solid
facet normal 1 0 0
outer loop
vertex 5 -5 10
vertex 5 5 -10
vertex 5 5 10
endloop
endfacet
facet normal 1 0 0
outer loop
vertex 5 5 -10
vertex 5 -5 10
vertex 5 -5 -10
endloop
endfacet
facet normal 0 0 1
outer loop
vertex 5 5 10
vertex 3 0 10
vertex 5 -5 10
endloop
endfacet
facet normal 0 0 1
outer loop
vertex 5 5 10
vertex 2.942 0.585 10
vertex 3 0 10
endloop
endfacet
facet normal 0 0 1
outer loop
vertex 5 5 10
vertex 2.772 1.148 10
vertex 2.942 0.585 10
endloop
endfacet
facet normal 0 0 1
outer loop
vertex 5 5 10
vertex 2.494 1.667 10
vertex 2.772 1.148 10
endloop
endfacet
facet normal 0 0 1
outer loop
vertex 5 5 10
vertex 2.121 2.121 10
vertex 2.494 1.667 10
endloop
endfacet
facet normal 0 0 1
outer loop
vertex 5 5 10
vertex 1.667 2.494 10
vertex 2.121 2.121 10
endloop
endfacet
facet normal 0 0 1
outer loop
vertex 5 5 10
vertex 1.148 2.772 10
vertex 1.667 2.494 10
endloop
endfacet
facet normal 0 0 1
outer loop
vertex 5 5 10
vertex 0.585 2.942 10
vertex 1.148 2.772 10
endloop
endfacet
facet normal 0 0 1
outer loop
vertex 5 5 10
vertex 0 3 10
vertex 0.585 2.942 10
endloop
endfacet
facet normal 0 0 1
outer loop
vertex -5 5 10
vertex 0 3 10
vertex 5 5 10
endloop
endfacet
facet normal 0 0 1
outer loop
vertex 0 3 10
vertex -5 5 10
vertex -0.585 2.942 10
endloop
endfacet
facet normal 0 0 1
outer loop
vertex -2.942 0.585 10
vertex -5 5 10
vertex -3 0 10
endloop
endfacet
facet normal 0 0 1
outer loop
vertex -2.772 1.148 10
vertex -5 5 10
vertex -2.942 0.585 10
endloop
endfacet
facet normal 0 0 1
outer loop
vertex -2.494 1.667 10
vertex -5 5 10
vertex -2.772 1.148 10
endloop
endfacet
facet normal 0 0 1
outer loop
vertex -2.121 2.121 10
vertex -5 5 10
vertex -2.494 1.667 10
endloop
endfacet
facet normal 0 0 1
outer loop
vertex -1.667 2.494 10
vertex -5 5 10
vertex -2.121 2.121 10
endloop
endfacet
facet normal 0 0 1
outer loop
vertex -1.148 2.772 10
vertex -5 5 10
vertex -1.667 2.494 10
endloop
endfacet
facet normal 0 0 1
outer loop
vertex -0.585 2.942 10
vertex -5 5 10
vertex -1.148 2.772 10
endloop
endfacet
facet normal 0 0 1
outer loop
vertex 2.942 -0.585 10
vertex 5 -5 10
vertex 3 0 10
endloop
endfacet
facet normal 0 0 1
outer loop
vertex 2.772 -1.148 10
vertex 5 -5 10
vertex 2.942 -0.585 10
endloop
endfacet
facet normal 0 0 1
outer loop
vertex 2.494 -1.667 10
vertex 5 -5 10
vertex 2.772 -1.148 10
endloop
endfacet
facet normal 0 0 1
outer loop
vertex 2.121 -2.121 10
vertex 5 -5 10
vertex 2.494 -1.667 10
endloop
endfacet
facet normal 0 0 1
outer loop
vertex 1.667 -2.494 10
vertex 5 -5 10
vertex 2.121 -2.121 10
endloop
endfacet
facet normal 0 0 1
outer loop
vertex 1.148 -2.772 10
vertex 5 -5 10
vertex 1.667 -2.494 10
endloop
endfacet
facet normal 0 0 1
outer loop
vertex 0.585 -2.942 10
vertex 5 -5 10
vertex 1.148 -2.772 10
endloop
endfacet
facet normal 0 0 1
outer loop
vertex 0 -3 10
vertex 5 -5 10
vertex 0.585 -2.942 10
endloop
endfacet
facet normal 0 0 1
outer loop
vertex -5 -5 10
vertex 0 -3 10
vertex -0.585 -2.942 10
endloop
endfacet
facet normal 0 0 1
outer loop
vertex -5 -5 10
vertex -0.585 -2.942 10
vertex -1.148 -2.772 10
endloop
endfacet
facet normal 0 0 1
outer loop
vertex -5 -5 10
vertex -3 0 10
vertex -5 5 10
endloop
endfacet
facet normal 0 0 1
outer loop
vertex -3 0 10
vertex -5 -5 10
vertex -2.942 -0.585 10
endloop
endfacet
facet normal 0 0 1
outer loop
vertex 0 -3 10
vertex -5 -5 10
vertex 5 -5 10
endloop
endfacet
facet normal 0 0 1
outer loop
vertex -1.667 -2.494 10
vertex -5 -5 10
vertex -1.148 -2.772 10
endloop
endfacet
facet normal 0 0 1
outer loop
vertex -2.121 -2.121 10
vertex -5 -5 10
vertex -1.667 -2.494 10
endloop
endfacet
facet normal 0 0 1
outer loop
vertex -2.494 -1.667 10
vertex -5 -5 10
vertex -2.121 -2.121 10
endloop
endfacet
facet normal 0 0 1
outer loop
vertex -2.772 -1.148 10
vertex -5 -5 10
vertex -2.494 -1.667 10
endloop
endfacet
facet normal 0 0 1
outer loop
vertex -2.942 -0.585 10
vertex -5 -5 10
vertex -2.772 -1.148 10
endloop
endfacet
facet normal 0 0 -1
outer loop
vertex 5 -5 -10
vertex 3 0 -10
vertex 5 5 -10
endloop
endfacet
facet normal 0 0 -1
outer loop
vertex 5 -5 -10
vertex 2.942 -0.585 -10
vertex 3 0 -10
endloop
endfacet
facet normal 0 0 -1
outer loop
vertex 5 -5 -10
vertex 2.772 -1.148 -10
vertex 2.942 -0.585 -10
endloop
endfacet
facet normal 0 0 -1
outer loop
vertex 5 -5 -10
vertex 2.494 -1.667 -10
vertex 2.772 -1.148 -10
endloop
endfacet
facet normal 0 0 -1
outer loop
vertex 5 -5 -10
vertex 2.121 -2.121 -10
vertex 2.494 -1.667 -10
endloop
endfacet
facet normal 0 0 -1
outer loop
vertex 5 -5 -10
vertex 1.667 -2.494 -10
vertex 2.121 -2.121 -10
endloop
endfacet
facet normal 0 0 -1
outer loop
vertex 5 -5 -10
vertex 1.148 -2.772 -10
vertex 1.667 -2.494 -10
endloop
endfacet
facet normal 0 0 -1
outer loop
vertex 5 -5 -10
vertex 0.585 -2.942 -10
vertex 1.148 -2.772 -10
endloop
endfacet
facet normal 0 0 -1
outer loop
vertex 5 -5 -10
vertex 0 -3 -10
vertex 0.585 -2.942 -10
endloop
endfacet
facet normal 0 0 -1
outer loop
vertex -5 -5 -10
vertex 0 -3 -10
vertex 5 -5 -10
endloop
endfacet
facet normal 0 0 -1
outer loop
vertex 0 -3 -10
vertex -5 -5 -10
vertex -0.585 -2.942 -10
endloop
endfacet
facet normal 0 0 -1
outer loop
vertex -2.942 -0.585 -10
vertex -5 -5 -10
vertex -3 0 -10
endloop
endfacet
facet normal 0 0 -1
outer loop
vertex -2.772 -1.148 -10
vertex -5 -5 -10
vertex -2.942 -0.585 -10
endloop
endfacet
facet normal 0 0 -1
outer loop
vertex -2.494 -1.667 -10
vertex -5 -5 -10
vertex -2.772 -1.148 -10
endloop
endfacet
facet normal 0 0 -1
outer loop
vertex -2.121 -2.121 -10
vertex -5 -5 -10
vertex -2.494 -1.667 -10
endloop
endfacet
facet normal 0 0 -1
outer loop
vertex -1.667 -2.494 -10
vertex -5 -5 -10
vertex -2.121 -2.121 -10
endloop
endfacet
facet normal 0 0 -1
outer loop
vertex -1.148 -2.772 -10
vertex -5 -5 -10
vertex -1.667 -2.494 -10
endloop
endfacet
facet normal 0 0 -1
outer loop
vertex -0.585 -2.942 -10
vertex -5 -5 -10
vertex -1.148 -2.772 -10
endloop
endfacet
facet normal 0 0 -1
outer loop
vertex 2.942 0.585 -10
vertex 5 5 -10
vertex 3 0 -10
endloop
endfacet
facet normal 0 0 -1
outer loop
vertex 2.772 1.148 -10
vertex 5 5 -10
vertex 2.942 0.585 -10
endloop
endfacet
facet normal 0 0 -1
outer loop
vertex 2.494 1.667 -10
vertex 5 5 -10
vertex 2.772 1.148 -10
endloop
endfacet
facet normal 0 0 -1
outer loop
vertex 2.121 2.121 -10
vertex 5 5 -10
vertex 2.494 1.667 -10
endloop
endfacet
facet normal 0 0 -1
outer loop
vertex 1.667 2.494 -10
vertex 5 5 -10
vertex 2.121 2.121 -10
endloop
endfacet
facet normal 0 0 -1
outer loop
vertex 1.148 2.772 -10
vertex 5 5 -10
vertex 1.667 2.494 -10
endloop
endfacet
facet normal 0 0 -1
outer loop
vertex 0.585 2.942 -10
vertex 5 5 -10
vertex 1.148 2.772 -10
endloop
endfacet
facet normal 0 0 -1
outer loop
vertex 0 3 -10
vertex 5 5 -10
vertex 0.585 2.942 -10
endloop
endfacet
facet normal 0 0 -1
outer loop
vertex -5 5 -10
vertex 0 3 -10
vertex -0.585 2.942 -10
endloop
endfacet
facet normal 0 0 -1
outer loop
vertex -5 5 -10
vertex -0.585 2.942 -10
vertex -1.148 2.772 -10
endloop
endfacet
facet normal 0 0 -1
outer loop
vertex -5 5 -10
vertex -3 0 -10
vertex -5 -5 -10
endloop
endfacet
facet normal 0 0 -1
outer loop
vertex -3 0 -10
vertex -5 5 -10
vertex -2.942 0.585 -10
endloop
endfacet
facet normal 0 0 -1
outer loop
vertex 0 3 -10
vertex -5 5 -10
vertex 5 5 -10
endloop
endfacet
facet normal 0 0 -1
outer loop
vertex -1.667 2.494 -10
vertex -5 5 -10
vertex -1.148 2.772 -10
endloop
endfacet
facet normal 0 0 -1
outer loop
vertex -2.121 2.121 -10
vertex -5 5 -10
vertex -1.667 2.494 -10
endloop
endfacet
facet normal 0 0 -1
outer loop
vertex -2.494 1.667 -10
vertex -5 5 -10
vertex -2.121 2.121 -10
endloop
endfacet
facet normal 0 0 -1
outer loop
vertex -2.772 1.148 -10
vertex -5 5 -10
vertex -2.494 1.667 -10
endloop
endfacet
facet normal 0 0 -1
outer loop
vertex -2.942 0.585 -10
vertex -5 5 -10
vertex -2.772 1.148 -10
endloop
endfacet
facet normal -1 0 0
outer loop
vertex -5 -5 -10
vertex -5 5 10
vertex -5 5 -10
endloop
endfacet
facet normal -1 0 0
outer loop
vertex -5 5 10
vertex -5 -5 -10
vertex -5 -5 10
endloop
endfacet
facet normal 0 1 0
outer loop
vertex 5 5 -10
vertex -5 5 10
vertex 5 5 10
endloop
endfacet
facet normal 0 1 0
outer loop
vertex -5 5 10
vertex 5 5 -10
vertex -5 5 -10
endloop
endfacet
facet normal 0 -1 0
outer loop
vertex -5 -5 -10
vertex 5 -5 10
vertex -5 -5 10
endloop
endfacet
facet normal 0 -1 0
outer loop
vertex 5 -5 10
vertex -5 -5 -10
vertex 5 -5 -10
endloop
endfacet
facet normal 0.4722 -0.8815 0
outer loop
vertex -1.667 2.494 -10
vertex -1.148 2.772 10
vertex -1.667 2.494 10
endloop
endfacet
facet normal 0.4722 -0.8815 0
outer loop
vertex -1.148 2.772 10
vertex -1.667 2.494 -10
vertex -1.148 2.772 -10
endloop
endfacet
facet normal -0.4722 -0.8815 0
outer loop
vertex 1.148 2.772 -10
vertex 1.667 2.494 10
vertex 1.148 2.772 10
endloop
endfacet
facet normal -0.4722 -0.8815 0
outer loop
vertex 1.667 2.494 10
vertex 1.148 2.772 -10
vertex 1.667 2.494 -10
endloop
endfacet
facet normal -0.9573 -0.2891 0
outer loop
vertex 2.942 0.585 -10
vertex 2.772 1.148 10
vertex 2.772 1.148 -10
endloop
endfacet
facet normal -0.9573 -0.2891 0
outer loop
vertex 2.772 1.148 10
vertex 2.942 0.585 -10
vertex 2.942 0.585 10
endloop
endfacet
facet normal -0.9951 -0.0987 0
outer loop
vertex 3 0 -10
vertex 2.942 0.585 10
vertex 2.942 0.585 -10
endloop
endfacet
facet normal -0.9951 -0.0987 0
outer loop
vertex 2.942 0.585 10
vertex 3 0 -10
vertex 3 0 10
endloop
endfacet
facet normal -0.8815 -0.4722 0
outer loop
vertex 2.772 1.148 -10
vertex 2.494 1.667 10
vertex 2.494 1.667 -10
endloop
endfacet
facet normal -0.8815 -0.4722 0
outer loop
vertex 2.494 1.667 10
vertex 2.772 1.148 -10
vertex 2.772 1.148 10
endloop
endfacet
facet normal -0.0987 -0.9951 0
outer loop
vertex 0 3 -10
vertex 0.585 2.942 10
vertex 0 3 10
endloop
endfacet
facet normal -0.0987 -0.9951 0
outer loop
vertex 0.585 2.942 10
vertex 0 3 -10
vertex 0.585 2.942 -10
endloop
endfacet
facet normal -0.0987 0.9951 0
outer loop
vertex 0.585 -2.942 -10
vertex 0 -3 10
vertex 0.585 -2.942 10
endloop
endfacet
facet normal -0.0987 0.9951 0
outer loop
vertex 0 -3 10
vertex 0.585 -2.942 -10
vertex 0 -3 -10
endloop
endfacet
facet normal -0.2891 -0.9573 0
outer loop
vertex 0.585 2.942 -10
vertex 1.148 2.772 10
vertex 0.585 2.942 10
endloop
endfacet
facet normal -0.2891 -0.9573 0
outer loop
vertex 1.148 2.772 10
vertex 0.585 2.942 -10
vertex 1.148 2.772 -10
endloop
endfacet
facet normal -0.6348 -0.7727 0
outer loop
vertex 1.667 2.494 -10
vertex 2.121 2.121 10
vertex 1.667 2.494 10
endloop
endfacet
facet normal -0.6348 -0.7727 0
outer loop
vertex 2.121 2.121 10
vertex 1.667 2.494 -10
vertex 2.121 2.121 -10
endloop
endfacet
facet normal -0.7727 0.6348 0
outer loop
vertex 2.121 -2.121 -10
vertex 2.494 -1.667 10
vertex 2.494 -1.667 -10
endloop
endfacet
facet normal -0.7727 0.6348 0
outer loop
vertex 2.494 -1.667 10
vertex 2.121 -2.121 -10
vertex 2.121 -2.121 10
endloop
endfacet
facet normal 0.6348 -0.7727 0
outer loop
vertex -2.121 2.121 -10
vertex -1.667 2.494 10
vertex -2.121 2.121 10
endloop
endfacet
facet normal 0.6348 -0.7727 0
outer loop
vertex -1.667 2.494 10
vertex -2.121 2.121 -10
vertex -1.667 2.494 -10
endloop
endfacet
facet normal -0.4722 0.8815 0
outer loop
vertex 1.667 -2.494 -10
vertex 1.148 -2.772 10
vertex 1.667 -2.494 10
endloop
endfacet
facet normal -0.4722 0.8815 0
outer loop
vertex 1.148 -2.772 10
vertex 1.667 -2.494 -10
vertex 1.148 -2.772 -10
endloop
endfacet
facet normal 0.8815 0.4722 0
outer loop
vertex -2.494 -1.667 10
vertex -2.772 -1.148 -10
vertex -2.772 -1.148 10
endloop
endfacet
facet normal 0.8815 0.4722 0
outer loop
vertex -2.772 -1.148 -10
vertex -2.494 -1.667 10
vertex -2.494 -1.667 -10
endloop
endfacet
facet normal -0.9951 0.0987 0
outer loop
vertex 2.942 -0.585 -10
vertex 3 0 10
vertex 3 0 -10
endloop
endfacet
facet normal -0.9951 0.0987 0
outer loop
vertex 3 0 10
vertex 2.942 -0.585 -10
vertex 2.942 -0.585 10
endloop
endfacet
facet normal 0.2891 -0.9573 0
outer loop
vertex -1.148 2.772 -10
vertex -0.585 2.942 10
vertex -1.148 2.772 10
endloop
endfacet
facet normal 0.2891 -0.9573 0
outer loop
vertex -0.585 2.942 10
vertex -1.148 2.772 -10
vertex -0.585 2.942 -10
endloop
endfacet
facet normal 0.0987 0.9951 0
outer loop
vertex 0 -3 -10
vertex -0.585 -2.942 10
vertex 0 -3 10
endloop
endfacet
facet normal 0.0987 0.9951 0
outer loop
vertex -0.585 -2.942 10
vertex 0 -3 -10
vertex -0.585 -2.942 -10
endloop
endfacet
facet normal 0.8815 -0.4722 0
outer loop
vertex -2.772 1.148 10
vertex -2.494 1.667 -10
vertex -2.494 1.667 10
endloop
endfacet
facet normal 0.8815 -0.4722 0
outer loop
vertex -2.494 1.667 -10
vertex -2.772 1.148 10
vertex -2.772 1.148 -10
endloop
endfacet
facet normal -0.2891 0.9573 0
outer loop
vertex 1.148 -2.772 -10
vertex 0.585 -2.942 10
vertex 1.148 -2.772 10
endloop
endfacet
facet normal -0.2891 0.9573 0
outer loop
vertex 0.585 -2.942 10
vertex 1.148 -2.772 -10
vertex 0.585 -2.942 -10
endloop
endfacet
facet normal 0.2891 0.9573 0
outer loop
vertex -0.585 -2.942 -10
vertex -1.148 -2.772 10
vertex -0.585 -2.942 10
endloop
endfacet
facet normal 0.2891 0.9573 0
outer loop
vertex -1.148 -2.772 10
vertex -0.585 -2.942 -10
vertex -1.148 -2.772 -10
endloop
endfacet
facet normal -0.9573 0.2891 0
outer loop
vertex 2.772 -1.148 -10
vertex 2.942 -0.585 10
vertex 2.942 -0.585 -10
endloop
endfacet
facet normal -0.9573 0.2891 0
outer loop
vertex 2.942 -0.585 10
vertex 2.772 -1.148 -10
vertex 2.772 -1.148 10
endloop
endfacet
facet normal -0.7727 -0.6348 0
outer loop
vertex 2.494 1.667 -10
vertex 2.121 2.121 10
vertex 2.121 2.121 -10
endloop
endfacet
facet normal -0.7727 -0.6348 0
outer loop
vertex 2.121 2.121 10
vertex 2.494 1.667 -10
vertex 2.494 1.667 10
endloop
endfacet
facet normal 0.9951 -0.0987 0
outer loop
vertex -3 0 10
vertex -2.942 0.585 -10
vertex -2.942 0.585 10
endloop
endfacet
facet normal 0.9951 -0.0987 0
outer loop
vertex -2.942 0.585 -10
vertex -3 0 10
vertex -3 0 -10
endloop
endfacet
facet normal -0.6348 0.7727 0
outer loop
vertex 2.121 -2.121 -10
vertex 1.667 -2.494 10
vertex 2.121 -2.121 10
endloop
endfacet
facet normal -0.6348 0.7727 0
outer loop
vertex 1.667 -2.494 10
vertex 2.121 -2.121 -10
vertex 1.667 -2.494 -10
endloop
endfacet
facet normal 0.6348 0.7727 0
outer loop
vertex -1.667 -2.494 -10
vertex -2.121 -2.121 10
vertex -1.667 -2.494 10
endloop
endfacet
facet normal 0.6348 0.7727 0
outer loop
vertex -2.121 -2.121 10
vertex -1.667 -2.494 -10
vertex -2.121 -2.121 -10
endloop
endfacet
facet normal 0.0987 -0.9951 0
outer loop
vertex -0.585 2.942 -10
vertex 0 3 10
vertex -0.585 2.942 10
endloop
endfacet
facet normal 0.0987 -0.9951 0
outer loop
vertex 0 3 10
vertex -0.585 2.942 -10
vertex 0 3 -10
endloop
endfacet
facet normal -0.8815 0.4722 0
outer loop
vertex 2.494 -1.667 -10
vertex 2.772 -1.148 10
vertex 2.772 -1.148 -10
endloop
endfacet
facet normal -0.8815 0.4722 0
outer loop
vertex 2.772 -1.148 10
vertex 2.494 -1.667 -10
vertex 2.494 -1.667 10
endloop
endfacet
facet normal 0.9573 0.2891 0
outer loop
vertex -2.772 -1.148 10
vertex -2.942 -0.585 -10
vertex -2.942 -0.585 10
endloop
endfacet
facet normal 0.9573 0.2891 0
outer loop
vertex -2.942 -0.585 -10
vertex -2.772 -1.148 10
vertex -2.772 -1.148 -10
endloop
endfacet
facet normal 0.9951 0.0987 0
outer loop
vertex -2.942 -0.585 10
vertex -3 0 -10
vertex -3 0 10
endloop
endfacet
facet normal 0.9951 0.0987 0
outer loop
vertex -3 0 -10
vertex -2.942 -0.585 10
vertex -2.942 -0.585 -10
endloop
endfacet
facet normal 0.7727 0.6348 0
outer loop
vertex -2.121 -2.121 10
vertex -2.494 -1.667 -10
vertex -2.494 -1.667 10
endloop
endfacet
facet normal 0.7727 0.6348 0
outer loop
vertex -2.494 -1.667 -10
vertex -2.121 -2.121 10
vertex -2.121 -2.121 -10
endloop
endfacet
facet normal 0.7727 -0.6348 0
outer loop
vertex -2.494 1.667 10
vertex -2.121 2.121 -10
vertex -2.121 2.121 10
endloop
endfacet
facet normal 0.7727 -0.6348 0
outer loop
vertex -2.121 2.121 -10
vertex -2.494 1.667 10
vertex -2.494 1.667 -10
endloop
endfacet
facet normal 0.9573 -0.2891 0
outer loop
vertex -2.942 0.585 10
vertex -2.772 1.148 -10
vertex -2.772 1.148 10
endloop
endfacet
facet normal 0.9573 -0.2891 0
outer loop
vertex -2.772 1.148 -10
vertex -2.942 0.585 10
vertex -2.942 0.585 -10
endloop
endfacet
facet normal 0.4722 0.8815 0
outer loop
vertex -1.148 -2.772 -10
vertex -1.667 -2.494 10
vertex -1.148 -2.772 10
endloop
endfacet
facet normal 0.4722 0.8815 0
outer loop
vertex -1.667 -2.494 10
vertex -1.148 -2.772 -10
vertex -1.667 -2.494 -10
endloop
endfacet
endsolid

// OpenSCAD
// Customizer parameters
width = 10; // [5:50]
height = 20; // [5:100]
radius = 3; // [1:10]

difference() {
    cube([width, width, height], center = true);
    cylinder(r = radius, h = height + 1, center = true, $fn = 32);
}
